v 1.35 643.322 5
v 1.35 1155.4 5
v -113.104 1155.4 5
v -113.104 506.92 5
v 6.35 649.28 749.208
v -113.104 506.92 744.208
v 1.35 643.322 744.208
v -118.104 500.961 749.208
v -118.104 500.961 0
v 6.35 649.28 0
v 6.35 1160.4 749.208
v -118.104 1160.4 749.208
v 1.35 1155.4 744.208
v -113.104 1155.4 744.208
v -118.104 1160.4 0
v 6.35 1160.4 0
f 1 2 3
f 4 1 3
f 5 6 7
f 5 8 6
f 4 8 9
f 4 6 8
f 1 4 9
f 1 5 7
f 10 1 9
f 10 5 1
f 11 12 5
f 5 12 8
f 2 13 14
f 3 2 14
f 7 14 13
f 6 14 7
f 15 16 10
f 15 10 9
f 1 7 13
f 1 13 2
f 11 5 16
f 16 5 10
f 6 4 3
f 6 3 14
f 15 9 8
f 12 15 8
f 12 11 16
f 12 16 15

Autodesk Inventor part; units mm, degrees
ref_plane "YZ Plane" through (0, 0, 0) normal (1, 0, 0) x (0, 1, 0)
ref_plane "XZ Plane" through (0, 0, 0) normal (0, 1, 0) x (-1, 0, 0)
ref_plane "XY Plane" through (0, 0, 0) normal (0, 0, 1) x (1, 0, 0)
ref_plane "Work Plane1" through (-12.7, 499.15, -25.4) normal (0, 1, 0) x (-1, 0, 0)
sketch "Sketch1" plane through (-12.7, 499.15, -25.4) normal (0, 1, 0) x (-1, 0, 0)
  line L0 (-19.05, 819.05) -> (-19.05, -19.05) projected
  line L1 (-12.7, 35.4) -> (-2.7, 35.4) projected
  line L2 (-12.7, 764.6) -> (-2.7, 764.6) projected
  line L3 (-19.05, 25.4) -> (105.4044, 25.4)
  line L4 (105.4044, 25.4) -> (105.4044, 774.6084)
  line L5 (105.4044, 774.6084) -> (-19.05, 774.6084)
  line L6 (-19.05, 774.6084) -> (-19.05, 25.4)
  point P0 (-12.7, 25.4)
  point P1 (-19.05, 774.6084)
  dimension "d0" = 749.2084
  dimension "d1" = 124.4544
extrude "Extrusion1" add sketch "Sketch1" along normal blind 661.25
ref_plane "Work Plane2" through (6.35, 499.15, 793.65) normal (0.766, -0.6428, 0) x (0, 0, -1)
sketch "Sketch2" plane through (6.35, 499.15, 793.65) normal (0.766, -0.6428, 0) x (0, 0, -1)
  line L0 (44.4416, 0) -> (44.4416, 506.5469) projected
  line L1 (44.4416, 167.8683) -> (793.65, 167.8683)
  line L2 (793.65, 167.8683) -> (793.65, -166.4116)
  line L3 (793.65, -166.4116) -> (44.4416, -166.4116)
  line L4 (44.4416, -166.4116) -> (44.4416, 167.8683)
  point P0 (793.65, -386.4528)
extrude "Extrusion2" cut sketch "Sketch2" against normal blind 96.5
shell "Shell1" thickness 5 removed faces 1 at (-35.1348, 599.8377, 499.4722)
properties part number "DUSTPAN" material "Polystyrene"
